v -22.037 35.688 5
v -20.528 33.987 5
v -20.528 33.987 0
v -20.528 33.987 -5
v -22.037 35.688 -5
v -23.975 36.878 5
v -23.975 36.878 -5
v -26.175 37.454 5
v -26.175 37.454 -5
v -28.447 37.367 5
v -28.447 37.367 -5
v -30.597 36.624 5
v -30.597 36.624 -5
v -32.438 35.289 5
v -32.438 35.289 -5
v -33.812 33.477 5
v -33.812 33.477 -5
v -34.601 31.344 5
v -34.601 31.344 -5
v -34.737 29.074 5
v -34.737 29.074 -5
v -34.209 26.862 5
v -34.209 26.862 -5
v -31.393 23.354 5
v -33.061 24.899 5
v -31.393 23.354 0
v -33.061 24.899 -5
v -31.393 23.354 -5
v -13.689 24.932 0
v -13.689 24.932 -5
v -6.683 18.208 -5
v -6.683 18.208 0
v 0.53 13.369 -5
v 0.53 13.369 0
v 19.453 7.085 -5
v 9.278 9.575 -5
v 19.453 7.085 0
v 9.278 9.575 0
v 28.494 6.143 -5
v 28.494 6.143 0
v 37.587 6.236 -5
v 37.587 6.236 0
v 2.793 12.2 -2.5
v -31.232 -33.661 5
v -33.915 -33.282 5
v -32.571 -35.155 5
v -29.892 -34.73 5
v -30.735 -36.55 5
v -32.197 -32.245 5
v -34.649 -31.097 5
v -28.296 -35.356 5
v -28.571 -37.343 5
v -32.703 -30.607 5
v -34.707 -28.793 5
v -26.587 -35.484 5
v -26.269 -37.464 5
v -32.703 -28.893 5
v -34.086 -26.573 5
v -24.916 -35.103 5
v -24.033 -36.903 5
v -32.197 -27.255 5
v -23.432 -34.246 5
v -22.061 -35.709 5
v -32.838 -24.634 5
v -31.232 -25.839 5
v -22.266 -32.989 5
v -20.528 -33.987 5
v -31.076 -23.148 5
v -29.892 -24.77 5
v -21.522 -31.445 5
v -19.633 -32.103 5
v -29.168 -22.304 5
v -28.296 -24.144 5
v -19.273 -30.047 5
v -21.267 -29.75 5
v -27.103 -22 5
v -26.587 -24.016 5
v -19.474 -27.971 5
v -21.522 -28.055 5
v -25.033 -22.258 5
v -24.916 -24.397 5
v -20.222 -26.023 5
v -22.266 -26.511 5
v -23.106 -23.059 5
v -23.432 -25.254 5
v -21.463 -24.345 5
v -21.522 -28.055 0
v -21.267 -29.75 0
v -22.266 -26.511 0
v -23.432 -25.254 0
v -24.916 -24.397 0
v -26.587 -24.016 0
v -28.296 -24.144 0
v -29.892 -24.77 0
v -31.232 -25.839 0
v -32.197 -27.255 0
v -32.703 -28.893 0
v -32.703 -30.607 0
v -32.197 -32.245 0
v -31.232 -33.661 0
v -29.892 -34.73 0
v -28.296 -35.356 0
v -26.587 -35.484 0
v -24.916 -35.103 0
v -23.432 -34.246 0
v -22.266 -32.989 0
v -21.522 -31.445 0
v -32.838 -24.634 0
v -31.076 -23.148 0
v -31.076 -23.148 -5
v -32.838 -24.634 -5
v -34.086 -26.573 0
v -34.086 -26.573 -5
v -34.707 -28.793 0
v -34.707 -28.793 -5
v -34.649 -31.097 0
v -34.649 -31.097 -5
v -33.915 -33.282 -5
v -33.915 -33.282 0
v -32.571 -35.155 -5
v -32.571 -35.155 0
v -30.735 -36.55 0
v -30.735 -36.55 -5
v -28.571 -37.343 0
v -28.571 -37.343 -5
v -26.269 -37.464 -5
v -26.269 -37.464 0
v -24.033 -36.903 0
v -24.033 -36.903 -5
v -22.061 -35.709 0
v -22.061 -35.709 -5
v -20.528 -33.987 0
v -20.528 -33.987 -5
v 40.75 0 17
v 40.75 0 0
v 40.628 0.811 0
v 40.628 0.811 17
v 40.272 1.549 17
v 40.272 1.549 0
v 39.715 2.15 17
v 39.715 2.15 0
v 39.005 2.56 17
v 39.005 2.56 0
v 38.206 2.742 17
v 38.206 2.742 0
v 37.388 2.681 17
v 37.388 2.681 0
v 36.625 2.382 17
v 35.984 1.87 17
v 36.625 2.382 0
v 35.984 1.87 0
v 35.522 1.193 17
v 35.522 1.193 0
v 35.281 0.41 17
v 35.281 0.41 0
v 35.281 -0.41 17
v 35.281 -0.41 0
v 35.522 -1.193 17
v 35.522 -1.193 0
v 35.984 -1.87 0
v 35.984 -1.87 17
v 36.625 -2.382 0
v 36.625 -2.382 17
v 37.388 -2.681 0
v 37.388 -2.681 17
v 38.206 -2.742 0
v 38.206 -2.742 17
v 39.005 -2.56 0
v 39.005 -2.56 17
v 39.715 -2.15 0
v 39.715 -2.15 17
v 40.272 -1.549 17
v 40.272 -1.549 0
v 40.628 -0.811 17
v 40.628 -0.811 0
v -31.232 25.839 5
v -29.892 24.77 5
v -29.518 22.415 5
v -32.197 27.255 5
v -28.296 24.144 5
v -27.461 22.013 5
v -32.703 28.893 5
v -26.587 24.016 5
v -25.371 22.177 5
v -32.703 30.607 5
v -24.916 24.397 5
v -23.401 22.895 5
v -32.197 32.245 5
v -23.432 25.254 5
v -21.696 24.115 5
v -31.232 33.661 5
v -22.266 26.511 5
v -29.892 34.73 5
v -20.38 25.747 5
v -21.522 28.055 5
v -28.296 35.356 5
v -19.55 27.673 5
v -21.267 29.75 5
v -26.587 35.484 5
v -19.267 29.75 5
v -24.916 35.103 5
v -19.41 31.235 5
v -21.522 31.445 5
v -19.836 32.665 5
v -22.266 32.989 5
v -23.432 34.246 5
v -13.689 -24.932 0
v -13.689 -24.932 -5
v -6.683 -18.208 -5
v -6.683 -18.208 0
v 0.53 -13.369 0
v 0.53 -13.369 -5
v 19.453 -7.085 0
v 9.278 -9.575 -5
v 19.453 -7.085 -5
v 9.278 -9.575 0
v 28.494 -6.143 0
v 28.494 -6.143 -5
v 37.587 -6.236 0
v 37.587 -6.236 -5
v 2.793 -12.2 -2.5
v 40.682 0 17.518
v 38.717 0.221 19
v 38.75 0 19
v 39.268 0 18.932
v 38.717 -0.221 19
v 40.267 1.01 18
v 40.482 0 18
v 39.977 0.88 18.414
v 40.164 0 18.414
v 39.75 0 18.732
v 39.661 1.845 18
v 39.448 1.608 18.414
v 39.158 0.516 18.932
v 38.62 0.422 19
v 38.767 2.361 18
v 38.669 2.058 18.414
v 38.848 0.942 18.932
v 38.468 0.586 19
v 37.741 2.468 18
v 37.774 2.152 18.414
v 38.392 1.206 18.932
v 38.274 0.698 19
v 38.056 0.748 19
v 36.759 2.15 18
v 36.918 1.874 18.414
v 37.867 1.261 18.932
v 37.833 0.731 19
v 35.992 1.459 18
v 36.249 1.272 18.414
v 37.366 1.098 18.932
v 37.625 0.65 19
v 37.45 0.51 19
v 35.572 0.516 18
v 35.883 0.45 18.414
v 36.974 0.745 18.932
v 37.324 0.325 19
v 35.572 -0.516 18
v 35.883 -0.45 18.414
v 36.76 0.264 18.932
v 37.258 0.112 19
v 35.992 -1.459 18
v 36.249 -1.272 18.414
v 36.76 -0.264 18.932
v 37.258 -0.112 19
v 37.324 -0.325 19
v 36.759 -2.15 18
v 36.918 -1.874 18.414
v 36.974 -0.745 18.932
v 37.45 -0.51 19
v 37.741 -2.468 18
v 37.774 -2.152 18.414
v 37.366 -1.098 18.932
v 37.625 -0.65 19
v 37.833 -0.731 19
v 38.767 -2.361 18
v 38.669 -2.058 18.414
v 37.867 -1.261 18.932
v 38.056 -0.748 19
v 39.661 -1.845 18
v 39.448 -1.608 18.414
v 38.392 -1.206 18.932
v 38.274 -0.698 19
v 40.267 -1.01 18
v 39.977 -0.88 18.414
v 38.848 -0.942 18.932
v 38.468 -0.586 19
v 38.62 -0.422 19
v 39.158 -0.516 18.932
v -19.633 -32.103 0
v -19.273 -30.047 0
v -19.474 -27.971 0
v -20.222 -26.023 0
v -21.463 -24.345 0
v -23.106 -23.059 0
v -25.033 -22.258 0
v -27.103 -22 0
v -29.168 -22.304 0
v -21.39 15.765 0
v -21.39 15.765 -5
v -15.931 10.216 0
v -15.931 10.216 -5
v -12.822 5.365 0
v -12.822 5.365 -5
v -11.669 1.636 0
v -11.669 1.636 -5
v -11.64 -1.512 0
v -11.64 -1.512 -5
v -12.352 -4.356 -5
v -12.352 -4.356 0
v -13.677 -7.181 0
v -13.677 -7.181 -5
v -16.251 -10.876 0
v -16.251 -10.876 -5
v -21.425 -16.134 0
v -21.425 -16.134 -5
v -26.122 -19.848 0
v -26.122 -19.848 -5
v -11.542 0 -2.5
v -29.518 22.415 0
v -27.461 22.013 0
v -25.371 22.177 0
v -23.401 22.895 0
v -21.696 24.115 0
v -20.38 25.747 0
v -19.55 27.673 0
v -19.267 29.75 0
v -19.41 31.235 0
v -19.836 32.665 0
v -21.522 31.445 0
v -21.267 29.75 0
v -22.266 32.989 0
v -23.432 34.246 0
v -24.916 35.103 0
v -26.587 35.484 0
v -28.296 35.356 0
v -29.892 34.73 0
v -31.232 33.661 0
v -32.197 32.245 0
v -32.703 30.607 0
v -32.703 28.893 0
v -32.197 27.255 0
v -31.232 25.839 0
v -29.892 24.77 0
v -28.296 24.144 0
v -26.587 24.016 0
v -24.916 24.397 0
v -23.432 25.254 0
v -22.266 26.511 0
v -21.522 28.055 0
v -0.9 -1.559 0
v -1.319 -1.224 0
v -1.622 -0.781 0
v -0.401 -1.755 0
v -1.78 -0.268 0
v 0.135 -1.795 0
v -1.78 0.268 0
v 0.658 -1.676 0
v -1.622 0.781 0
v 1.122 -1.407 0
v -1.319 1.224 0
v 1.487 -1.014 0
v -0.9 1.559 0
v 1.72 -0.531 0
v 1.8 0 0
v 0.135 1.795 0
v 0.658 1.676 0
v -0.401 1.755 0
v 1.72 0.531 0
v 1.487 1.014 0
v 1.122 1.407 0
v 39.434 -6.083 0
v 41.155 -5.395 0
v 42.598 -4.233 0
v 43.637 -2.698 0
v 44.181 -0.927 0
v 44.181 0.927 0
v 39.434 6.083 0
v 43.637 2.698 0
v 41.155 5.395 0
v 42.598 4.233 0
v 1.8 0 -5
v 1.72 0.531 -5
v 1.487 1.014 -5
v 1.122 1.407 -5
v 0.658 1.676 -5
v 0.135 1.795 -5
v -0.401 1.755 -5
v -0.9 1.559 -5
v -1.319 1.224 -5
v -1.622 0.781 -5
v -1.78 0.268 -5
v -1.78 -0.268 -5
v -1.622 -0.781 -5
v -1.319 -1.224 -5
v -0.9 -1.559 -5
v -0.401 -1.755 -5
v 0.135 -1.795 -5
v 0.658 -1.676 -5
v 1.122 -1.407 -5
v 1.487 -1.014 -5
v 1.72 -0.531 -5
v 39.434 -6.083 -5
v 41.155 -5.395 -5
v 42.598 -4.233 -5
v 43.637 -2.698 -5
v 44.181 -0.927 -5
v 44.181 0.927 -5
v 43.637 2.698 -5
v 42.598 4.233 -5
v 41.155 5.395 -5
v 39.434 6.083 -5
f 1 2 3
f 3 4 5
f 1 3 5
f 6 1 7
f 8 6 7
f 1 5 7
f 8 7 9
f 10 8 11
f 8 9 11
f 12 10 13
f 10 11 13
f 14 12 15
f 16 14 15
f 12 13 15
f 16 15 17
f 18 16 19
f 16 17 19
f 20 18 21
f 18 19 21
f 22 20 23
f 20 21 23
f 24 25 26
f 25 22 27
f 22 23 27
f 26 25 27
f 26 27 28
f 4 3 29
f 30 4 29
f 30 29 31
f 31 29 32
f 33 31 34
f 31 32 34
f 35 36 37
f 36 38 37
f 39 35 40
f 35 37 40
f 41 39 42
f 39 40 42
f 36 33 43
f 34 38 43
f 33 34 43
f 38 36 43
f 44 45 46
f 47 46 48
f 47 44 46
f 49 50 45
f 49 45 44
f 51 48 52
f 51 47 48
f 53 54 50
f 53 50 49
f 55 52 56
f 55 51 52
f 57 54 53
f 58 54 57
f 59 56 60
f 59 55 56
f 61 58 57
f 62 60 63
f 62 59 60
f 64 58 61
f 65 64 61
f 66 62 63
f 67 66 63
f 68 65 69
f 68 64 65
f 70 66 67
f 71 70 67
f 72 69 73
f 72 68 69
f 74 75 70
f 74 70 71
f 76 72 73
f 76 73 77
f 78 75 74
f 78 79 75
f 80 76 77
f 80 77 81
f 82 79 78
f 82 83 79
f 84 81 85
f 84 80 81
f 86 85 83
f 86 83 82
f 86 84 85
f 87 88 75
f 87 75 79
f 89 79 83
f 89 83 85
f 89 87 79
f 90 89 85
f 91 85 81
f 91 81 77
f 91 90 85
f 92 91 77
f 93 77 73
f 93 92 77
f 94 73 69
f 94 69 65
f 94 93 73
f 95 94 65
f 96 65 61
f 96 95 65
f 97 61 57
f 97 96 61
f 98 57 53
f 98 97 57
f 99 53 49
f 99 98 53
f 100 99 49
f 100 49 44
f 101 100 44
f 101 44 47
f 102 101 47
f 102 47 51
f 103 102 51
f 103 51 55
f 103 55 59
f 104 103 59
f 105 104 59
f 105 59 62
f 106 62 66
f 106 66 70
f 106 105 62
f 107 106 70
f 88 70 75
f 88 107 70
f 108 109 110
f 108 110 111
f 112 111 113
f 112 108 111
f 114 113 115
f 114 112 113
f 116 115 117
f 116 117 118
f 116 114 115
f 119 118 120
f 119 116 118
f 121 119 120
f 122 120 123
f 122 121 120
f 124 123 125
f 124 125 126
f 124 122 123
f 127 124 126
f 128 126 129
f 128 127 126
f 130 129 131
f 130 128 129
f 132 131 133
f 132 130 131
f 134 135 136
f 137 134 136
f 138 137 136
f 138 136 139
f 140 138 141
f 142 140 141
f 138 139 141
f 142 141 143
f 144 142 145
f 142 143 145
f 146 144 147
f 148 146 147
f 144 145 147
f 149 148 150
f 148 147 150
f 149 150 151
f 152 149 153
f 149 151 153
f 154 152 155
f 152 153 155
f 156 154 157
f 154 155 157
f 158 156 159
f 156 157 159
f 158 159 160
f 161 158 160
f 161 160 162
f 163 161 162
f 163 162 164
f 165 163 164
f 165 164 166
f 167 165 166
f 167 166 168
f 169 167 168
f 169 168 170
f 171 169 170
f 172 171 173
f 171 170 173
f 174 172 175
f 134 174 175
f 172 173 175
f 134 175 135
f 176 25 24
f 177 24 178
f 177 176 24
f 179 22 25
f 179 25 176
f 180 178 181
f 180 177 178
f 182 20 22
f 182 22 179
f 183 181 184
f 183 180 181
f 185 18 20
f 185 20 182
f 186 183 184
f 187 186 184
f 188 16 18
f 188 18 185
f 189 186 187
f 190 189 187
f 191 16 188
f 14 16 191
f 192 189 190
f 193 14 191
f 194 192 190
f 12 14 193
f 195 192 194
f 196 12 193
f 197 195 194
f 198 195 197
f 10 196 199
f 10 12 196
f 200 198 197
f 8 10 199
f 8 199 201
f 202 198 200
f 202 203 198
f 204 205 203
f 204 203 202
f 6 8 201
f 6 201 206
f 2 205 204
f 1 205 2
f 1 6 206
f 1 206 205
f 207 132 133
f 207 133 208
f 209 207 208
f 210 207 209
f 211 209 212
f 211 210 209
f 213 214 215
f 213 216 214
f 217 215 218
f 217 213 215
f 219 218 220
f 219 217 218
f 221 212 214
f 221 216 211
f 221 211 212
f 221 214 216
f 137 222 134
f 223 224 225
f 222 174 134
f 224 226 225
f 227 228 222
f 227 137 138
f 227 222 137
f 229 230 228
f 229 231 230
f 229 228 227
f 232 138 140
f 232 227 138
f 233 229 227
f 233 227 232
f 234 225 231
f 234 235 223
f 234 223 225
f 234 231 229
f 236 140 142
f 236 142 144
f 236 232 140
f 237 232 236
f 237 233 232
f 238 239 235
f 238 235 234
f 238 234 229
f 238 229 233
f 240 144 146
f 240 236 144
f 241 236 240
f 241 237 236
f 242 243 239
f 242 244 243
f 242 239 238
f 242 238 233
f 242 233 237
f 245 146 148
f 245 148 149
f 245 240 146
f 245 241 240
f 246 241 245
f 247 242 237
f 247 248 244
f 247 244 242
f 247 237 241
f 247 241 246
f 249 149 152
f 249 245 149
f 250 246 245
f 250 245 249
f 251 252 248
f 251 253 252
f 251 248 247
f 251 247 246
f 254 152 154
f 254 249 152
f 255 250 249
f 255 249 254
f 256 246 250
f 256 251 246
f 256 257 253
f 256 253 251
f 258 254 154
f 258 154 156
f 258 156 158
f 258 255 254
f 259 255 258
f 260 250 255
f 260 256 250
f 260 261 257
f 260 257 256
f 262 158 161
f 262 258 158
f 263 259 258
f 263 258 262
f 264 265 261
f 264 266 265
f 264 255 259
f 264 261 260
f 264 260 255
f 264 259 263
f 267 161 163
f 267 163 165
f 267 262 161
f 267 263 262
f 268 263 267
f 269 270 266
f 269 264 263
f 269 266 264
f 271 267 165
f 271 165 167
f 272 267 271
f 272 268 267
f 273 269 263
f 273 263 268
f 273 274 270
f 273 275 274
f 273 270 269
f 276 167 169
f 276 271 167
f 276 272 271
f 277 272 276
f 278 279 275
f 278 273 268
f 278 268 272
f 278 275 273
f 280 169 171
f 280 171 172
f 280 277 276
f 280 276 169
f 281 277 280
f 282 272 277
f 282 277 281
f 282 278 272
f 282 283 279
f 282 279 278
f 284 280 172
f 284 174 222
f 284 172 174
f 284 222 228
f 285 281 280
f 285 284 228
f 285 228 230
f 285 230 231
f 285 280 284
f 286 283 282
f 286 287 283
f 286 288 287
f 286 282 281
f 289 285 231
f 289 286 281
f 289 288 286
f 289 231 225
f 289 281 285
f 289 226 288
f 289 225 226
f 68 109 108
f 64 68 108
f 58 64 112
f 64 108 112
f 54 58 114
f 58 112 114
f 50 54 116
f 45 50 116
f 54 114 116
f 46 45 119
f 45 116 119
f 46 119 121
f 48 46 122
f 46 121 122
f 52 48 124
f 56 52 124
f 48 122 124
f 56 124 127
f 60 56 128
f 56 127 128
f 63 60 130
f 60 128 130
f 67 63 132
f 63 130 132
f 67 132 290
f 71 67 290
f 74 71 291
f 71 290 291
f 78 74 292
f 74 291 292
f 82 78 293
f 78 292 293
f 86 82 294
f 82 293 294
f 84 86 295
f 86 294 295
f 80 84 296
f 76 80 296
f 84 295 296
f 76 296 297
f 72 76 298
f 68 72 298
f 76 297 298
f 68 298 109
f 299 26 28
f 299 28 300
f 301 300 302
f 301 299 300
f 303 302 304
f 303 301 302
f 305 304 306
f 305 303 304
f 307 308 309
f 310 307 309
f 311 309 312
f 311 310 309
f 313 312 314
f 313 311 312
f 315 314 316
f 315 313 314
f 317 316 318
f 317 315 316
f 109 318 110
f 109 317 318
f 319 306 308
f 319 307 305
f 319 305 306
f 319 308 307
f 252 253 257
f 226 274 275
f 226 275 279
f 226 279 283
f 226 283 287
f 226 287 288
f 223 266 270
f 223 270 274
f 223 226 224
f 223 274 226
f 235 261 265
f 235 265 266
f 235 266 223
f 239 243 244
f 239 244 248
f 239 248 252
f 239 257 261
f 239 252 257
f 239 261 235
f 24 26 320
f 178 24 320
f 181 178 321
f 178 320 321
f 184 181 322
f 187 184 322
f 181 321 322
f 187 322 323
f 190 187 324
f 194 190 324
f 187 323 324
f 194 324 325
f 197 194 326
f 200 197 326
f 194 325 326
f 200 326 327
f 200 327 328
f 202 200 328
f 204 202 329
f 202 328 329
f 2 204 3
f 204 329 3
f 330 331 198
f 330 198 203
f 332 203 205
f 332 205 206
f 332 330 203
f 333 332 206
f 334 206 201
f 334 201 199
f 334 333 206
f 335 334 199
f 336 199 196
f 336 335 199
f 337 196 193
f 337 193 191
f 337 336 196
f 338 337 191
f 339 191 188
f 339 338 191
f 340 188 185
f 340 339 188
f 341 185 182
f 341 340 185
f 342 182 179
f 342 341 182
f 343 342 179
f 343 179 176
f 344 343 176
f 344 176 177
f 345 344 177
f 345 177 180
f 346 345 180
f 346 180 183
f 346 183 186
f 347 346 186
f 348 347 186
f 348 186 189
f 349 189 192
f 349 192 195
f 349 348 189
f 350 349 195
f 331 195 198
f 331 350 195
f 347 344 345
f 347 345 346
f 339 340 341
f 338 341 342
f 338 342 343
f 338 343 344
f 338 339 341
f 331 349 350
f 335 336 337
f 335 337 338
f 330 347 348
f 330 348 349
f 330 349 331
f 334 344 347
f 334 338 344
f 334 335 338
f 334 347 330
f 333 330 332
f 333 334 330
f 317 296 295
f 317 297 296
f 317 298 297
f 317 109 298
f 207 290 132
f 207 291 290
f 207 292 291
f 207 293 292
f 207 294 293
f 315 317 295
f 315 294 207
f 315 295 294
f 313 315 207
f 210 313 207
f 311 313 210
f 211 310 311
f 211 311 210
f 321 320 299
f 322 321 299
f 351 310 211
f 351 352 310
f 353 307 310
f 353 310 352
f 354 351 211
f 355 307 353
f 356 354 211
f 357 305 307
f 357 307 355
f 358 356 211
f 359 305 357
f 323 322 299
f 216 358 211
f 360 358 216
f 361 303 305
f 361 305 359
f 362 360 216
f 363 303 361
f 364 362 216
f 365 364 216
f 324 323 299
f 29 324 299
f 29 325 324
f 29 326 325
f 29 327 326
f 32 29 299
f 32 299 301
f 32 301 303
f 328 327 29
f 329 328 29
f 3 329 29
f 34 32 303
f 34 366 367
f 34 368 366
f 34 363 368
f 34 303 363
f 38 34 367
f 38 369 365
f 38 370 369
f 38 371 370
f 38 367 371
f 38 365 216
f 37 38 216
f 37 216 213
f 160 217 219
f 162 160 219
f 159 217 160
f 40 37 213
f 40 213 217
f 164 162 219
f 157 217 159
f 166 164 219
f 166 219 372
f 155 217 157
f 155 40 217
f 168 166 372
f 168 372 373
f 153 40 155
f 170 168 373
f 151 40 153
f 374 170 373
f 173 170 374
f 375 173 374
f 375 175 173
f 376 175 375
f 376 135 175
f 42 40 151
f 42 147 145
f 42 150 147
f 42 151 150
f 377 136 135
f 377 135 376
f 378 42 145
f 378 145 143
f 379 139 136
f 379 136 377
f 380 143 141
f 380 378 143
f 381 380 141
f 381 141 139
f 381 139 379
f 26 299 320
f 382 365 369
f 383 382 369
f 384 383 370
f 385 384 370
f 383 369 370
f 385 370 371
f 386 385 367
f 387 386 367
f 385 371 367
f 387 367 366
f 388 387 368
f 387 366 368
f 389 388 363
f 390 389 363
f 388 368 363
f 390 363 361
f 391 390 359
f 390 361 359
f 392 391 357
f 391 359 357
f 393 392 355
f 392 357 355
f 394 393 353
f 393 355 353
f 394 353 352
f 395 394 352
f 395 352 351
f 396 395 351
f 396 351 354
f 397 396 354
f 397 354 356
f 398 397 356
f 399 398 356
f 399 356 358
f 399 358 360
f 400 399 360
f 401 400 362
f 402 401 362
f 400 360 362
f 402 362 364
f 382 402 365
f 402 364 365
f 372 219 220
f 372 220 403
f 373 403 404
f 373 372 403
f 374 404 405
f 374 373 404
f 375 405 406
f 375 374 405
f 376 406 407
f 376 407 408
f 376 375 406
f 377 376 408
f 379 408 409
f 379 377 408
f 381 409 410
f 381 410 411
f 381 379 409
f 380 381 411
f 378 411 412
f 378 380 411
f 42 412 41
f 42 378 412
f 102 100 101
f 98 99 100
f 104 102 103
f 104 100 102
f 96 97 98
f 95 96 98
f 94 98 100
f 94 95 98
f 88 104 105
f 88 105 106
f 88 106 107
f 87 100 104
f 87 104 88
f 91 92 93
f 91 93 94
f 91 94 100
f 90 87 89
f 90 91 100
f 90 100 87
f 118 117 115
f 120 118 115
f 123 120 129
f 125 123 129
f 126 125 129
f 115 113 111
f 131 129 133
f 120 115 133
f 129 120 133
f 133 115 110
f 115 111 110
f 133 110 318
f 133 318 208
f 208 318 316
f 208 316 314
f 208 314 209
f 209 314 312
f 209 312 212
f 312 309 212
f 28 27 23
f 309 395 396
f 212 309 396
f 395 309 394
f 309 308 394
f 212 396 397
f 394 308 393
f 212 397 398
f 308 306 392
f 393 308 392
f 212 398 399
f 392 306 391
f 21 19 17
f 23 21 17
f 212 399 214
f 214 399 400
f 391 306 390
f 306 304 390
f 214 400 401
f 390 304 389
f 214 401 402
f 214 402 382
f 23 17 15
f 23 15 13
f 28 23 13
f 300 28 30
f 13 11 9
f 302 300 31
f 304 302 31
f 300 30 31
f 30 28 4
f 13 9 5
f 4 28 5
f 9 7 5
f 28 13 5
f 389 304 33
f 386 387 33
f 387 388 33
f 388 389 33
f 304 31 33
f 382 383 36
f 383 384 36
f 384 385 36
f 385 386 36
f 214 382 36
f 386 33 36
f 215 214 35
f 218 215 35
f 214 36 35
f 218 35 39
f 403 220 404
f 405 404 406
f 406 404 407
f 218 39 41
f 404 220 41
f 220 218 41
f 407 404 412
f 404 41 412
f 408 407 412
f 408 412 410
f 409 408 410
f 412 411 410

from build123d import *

# Parameters (mm, degrees)
F0_R     = 1.8
F0_R_2   = 2.75
F0_R_3   = 5.75
F1_DEPTH = 5
F2_DEPTH = 5
F3_DEPTH = 19
F4_R     = 2


with BuildPart() as f1:
    # F0 (on Top) → F1 (new body)
    with BuildSketch(Plane.XY):
        with BuildLine():
            ThreePointArc((-20.5278924674, 33.9874824942), (-19.5887790687, 31.9605740028), (-19.2668247456, 29.75))
            ThreePointArc((-19.2668247456, 29.75), (-23.4010274534, 22.8951834494), (-31.3928918273, 23.3537091298))
            add(Edge.make_bspline(
                [(-31.3928918273, 23.3537091298), (-21.6948142815, 16.7187016285), (-1.5034517677, 0.3606813033), (-21.4654354866, -17.2386169061), (-31.0762132171, -23.1481922751)],
                knots=[0, 0, 0, 0, 0.5014830117, 1, 1, 1, 1], degree=3))
            ThreePointArc((-31.0762132171, -23.1481922751), (-23.2351426235, -22.9852841651), (-19.2668247456, -29.75))
            ThreePointArc((-19.2668247456, -29.75), (-19.5887790687, -31.9605740028), (-20.5278924674, -33.9874824942))
            add(Edge.make_bspline(
                [(-20.5278924674, -33.9874824942), (-14.2038261776, -24.3033273542), (0.8934932617, -9.0476289983), (25.586991994, -5.4412595008), (37.5868020457, -6.2363264387)],
                knots=[0, 0, 0, 0, 0.4873954252, 1, 1, 1, 1], degree=3))
            ThreePointArc((37.5868020457, -6.2363264387), (44.25, 0), (37.5868020457, 6.2363264387))
            add(Edge.make_bspline(
                [(-20.5278924674, 33.9874824942), (-14.2038261776, 24.3033273542), (0.8934932617, 9.0476289983), (25.586991994, 5.4412595008), (37.5868020457, 6.2363264387)],
                knots=[0, 0, 0, 0, 0.4873954252, 1, 1, 1, 1], degree=3))
        make_face()
        Circle(F0_R, mode=Mode.SUBTRACT)
        with Locations((38, 0)):
            Circle(F0_R_2, mode=Mode.SUBTRACT)
        with BuildLine():
            ThreePointArc((-31.3928918273, 23.3537091298), (-23.4010274534, 22.8951834494), (-19.2668247456, 29.75))
            ThreePointArc((-19.2668247456, 29.75), (-19.5887790687, 31.9605740028), (-20.5278924674, 33.9874824942))
            ThreePointArc((-20.5278924674, 33.9874824942), (-32.4376488366, 35.2886971549), (-31.3928918273, 23.3537091298))
        make_face()
        with Locations((-27.0168247456, 29.75)):
            Circle(F0_R_3, mode=Mode.SUBTRACT)
        with BuildLine():
            ThreePointArc((-19.2668247456, -29.75), (-23.2351426235, -22.9852841651), (-31.0762132171, -23.1481922751))
            ThreePointArc((-31.0762132171, -23.1481922751), (-32.5709424875, -35.1550232293), (-20.5278924674, -33.9874824942))
            ThreePointArc((-20.5278924674, -33.9874824942), (-19.5887790687, -31.9605740028), (-19.2668247456, -29.75))
        make_face()
        with Locations((-27.0168247456, -29.75)):
            Circle(F0_R_3, mode=Mode.SUBTRACT)
        with Locations((-27.0168247456, 29.75)):
            Circle(F0_R_3)
        with Locations((-27.0168247456, -29.75)):
            Circle(F0_R_3)
        with Locations((38, 0)):
            Circle(F0_R_2)
    extrude(amount=-F1_DEPTH)

    # F0 (on Top) → F2 (join)
    with BuildSketch(Plane.XY):
        with BuildLine():
            ThreePointArc((-31.3928918273, 23.3537091298), (-23.4010274534, 22.8951834494), (-19.2668247456, 29.75))
            ThreePointArc((-19.2668247456, 29.75), (-19.5887790687, 31.9605740028), (-20.5278924674, 33.9874824942))
            ThreePointArc((-20.5278924674, 33.9874824942), (-32.4376488366, 35.2886971549), (-31.3928918273, 23.3537091298))
        make_face()
        with Locations((-27.0168247456, 29.75)):
            Circle(F0_R_3, mode=Mode.SUBTRACT)
        with BuildLine():
            ThreePointArc((-19.2668247456, -29.75), (-23.2351426235, -22.9852841651), (-31.0762132171, -23.1481922751))
            ThreePointArc((-31.0762132171, -23.1481922751), (-32.5709424875, -35.1550232293), (-20.5278924674, -33.9874824942))
            ThreePointArc((-20.5278924674, -33.9874824942), (-19.5887790687, -31.9605740028), (-19.2668247456, -29.75))
        make_face()
        with Locations((-27.0168247456, -29.75)):
            Circle(F0_R_3, mode=Mode.SUBTRACT)
    extrude(amount=F2_DEPTH)

    # F0 (on Top) → F3 (join)
    with BuildSketch(Plane.XY):
        with Locations((38, 0)):
            Circle(F0_R_2)
    extrude(amount=F3_DEPTH)

    # F4
    f4_edges = [f1.edges().sort_by_distance(p)[0] for p in [
        (35.25, 0, 19),
    ]]
    fillet(f4_edges, radius=F4_R)


solid = f1.part
